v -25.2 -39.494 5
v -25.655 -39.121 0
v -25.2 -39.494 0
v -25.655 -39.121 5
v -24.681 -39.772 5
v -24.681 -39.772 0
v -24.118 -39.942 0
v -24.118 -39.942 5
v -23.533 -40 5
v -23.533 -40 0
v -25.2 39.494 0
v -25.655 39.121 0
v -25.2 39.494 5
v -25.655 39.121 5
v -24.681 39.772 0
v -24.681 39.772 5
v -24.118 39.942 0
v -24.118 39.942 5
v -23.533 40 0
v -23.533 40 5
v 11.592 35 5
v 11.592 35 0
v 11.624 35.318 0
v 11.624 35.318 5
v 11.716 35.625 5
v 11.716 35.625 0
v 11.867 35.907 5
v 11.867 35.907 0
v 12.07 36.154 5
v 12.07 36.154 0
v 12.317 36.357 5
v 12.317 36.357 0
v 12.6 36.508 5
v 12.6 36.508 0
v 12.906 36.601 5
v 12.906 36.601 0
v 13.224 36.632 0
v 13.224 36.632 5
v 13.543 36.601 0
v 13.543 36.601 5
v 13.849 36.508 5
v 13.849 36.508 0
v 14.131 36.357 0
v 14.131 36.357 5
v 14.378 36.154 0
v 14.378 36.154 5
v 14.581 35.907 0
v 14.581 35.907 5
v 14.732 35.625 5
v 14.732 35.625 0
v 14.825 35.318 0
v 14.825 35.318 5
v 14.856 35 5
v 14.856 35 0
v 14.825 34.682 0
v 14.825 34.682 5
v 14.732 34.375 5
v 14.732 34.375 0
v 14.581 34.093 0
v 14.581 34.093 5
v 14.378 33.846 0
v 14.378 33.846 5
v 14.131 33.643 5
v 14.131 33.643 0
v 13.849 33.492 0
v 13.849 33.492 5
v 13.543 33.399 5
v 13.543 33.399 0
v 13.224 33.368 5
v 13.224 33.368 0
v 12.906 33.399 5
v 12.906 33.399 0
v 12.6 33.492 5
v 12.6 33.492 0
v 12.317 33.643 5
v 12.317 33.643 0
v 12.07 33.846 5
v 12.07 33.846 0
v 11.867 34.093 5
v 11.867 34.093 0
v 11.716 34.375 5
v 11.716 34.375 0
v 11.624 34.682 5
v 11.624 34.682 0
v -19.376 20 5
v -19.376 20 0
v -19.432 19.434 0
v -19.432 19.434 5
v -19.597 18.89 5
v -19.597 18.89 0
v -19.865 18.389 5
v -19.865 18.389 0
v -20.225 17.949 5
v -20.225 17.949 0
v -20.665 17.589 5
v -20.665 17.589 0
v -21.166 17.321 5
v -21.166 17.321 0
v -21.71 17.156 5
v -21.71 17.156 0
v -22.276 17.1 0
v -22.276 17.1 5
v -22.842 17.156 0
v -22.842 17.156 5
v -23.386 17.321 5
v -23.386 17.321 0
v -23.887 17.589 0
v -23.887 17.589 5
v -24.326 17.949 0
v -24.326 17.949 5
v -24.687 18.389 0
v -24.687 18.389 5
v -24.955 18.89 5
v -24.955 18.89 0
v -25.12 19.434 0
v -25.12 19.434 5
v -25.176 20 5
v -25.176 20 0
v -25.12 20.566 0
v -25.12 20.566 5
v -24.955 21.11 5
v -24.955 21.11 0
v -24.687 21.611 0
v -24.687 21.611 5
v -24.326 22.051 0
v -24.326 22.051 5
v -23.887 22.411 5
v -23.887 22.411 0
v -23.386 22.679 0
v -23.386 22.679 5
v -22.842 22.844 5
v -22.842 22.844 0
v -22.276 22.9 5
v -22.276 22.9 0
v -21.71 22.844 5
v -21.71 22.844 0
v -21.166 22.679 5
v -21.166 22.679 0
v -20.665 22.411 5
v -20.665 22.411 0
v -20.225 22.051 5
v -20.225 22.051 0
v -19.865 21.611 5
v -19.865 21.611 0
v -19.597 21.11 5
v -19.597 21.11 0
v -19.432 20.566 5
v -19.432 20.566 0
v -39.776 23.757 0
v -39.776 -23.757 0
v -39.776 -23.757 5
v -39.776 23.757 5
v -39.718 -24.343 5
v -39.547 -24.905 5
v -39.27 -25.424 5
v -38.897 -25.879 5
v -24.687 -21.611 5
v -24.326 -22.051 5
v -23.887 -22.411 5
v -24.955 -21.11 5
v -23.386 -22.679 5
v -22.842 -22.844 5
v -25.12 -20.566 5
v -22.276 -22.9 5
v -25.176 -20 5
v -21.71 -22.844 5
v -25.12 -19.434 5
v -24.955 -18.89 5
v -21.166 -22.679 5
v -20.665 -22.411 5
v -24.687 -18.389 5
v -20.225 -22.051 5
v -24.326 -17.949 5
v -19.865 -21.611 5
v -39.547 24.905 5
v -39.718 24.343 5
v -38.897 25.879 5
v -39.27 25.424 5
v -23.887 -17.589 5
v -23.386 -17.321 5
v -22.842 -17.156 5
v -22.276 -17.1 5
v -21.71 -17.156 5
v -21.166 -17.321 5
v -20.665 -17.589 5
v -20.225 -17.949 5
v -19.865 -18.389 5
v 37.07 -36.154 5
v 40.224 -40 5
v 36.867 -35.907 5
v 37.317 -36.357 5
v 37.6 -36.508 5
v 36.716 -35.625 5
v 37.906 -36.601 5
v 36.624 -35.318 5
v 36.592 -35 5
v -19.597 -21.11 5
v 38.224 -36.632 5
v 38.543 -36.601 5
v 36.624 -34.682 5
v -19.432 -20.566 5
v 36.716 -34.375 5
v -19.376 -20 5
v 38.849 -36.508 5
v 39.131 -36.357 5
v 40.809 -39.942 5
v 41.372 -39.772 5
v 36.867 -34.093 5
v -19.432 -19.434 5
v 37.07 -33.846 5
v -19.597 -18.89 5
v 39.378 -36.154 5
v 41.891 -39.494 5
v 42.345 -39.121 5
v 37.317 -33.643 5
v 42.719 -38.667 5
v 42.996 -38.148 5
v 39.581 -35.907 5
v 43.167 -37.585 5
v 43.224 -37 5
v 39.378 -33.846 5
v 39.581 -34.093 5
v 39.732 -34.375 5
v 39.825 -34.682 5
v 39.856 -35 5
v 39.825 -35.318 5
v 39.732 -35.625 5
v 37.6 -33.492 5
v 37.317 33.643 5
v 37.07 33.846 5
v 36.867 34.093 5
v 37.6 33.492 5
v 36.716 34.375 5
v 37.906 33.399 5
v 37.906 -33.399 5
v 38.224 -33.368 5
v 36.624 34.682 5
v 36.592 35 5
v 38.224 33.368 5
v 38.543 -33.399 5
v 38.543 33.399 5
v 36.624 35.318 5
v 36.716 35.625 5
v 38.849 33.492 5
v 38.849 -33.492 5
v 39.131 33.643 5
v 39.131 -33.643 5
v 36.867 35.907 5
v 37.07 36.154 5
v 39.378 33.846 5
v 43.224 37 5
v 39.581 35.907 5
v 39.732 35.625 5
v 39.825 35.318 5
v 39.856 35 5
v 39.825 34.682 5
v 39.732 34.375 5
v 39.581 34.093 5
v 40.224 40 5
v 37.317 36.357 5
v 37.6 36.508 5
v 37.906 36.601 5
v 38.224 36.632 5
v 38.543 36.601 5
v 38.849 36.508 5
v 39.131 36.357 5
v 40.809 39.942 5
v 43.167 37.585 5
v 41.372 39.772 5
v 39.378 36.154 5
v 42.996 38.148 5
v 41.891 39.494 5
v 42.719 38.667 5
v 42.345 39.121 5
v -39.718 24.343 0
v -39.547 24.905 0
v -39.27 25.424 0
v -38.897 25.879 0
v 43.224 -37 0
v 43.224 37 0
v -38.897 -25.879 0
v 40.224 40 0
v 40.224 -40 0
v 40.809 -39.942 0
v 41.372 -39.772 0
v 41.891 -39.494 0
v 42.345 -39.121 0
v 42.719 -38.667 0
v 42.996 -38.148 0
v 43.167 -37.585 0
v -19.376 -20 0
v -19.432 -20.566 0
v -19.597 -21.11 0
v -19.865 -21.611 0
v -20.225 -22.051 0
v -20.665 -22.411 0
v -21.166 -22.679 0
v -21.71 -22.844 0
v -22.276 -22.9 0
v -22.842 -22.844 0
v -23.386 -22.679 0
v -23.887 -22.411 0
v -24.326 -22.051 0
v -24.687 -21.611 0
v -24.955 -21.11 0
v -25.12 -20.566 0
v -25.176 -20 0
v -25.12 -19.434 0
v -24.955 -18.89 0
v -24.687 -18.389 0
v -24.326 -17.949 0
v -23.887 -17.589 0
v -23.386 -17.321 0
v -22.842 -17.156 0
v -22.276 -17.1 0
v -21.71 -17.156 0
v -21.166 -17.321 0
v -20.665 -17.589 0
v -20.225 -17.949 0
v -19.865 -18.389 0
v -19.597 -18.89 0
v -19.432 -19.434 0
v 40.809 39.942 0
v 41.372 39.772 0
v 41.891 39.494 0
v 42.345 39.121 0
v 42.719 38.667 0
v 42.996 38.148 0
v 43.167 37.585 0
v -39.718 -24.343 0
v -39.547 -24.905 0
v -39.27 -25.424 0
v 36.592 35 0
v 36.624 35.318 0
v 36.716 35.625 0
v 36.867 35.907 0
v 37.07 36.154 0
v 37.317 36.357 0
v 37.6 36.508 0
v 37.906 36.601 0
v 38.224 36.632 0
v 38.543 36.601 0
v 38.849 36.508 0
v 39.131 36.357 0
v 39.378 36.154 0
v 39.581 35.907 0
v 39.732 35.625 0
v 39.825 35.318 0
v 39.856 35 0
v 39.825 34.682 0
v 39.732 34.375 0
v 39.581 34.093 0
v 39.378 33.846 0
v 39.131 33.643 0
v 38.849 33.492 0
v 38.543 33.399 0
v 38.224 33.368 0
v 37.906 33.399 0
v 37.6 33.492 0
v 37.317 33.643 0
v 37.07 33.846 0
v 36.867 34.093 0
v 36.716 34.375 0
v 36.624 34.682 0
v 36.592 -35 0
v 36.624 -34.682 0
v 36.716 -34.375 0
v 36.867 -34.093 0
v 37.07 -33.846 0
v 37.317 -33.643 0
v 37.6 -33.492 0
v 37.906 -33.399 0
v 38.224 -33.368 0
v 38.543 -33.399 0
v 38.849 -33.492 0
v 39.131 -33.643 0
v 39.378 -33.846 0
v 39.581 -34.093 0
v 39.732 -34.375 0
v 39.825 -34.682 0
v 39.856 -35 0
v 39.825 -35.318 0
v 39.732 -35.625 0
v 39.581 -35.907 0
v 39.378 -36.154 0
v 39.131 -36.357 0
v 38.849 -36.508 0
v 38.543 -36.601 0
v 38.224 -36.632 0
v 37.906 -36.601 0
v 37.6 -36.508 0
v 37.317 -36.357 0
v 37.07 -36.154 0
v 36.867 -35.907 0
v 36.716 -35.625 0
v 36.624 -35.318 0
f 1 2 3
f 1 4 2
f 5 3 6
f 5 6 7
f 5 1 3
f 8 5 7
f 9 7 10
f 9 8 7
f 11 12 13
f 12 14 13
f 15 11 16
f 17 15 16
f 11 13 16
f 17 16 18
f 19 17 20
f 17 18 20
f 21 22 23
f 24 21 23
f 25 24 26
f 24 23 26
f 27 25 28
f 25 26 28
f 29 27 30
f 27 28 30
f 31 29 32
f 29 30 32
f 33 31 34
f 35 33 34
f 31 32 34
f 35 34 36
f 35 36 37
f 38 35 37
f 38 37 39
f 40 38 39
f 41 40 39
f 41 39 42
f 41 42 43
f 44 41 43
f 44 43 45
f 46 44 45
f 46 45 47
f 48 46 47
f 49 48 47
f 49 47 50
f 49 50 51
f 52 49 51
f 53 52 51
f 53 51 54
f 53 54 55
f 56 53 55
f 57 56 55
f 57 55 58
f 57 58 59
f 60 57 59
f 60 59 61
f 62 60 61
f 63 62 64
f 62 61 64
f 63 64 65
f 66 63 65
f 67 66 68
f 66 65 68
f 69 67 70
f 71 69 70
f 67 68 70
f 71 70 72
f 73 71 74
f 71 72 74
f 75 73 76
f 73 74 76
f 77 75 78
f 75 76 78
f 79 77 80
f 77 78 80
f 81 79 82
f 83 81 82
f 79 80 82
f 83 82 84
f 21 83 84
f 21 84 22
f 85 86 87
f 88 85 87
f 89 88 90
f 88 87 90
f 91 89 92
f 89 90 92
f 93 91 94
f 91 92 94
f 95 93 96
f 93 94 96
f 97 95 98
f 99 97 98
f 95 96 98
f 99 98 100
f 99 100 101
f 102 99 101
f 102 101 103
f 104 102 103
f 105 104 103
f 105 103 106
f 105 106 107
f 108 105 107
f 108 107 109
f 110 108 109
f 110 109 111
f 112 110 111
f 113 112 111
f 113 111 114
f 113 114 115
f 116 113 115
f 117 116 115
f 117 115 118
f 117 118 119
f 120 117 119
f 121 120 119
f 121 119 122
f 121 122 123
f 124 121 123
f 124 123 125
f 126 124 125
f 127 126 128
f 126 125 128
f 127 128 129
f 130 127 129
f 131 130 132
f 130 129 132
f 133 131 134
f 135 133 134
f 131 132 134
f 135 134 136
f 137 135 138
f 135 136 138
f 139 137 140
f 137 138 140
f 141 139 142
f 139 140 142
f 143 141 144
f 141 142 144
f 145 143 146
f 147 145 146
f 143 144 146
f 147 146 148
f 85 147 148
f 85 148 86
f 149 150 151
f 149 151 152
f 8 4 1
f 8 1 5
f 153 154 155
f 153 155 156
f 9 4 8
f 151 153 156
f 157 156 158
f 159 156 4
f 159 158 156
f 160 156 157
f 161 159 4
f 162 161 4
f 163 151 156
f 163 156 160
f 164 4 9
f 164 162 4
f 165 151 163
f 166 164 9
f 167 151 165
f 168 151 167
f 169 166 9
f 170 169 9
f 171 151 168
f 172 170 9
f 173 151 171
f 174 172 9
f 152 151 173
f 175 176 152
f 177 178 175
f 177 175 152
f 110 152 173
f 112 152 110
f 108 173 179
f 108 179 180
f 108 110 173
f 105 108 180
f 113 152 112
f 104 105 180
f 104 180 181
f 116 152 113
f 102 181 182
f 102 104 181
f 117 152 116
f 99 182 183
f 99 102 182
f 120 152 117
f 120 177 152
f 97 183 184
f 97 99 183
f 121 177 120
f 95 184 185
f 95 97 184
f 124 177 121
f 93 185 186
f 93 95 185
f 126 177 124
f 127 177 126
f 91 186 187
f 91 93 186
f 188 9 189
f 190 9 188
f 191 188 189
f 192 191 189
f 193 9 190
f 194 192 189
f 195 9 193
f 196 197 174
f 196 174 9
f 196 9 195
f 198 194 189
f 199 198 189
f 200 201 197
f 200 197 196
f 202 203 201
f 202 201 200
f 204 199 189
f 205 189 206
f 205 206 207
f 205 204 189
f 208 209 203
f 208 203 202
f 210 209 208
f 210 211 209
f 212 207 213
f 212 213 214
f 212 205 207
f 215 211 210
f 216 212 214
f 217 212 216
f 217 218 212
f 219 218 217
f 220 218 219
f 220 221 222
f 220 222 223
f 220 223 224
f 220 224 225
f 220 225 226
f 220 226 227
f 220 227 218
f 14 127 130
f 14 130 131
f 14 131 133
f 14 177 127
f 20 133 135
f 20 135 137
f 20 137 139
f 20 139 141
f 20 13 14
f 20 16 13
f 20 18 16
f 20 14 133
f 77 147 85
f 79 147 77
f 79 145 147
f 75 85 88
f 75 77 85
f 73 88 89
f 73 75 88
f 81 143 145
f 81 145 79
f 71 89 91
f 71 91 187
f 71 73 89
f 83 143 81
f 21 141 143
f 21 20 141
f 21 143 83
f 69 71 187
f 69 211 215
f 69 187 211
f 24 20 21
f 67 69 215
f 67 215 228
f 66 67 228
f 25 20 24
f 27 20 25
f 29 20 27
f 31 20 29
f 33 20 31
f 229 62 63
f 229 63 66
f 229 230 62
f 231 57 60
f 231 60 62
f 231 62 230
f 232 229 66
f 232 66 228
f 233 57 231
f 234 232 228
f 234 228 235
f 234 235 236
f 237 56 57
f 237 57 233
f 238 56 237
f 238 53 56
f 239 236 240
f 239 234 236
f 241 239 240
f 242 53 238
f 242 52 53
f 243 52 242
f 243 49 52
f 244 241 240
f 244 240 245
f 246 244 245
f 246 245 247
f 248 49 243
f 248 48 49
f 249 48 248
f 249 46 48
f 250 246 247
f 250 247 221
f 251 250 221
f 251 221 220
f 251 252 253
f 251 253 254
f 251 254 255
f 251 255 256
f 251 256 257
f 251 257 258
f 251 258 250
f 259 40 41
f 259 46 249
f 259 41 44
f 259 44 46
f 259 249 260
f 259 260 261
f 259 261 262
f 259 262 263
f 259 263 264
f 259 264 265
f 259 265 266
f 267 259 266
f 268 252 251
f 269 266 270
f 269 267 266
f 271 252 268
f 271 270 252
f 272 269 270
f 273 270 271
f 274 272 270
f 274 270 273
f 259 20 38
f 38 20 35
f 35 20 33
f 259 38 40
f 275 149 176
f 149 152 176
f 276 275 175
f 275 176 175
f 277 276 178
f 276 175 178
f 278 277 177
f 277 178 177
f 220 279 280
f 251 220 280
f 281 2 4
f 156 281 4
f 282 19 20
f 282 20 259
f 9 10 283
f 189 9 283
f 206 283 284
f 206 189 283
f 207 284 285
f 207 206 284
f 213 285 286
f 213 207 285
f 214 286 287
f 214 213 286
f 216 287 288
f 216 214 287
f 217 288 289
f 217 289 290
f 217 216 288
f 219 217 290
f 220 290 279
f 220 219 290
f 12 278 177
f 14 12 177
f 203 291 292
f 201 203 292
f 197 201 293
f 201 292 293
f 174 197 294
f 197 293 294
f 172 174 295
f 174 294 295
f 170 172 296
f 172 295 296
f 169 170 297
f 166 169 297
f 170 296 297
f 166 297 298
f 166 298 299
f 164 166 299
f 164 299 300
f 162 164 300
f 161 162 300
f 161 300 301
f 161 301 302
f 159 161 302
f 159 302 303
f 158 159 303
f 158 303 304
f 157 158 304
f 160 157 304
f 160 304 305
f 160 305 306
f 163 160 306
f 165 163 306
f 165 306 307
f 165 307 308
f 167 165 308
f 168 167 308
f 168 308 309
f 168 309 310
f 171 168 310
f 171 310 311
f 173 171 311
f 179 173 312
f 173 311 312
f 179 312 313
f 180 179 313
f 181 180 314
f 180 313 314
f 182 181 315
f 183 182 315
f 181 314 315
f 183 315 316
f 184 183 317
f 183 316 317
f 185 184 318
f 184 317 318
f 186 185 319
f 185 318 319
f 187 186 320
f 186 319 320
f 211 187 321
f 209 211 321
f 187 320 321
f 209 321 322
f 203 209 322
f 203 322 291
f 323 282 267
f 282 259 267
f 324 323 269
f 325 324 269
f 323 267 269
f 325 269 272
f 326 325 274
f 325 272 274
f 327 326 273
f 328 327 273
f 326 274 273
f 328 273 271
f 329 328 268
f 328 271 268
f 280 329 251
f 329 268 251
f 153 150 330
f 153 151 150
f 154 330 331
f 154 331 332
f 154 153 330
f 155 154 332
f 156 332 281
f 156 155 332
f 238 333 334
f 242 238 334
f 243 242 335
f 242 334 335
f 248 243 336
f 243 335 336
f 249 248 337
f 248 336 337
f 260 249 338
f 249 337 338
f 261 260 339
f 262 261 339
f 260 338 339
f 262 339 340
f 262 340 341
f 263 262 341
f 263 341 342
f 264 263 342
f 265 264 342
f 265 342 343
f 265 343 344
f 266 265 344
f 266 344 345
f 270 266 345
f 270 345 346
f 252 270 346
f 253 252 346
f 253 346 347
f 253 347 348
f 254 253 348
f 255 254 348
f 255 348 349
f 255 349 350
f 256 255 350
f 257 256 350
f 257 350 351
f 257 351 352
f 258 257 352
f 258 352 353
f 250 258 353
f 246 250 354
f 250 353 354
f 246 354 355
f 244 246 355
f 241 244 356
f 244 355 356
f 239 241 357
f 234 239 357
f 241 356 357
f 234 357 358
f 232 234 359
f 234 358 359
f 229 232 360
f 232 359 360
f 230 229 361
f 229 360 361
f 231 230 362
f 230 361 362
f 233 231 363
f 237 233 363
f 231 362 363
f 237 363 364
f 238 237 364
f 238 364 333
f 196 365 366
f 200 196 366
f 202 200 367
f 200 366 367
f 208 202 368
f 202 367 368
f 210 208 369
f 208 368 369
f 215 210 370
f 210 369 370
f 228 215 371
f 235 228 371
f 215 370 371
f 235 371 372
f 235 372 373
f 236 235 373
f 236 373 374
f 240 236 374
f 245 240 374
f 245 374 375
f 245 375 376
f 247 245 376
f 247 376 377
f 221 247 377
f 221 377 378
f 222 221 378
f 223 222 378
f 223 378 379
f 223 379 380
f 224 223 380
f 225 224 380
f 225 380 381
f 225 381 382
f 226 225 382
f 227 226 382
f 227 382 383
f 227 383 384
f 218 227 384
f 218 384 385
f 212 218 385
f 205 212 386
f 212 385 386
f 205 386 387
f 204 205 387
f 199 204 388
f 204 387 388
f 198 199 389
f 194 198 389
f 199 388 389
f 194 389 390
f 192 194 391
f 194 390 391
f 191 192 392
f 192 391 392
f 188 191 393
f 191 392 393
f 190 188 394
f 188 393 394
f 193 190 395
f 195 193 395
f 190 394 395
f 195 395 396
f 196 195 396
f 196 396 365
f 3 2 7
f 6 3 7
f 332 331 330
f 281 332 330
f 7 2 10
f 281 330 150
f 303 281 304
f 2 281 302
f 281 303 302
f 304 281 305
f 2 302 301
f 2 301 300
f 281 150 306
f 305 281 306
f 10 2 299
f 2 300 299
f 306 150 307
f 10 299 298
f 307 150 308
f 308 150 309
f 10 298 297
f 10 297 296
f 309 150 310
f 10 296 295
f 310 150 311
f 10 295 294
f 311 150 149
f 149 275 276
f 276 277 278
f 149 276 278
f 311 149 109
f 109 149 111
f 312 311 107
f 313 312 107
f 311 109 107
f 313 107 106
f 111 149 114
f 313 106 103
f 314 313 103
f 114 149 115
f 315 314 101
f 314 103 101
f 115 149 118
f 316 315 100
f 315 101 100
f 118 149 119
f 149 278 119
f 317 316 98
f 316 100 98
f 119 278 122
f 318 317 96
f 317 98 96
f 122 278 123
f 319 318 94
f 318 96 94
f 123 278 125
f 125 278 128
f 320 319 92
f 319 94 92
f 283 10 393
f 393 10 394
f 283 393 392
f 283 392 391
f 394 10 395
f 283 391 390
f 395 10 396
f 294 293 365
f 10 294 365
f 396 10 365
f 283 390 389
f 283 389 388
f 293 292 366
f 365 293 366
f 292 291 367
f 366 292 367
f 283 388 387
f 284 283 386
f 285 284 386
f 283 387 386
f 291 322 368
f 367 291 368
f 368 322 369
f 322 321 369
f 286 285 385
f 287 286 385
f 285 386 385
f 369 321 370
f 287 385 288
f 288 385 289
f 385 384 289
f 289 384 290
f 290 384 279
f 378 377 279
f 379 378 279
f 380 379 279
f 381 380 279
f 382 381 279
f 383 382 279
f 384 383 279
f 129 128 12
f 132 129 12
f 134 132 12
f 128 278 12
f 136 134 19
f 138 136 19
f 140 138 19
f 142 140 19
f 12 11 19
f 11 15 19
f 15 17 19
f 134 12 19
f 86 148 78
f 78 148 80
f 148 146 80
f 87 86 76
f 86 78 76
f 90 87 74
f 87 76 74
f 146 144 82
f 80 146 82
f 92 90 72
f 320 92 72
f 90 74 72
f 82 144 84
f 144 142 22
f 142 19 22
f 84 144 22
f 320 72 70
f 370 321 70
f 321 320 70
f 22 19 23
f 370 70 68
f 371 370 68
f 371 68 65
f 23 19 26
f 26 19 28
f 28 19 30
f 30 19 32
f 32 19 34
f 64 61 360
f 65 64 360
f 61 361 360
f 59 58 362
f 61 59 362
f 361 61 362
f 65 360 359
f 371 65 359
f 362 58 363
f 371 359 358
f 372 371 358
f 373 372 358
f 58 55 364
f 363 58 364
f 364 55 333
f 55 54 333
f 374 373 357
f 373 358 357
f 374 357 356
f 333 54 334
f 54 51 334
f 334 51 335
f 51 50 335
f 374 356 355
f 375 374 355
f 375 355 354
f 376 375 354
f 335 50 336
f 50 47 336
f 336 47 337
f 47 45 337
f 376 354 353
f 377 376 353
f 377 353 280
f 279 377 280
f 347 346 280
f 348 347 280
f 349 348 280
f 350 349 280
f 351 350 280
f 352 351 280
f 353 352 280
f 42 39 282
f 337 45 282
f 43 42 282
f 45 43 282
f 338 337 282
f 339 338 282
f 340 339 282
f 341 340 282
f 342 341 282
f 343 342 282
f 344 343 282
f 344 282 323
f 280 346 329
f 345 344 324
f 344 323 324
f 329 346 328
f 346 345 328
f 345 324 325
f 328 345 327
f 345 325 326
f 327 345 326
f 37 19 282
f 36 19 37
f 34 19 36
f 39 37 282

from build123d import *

# Parameters (mm, degrees)
BASE_W                = 83
BASE_H                = 80
MAIN_DEPTH            = 5
GEAR_AXIS_HOLES_D     = 5.8
CHAMFER1_SIZE         = 15
FILLET6_R             = 3
F_4_CLEARANCE_HOLE1_D = 3.2639


with BuildPart() as part:
    # Base → Main (new body)
    with BuildSketch(Plane.XY):
        with Locations((1.724154817, 0)):
            Rectangle(BASE_W, BASE_H)
    extrude(amount=MAIN_DEPTH)

    # Gear Axis Holes (through all)
    with Locations(Plane(origin=(0, 0, 5), x_dir=(-1, 0, 0), z_dir=(0, 0, 1))):
        with Locations((22.275845183, 20), (22.275845183, -20)):
            Hole(GEAR_AXIS_HOLES_D / 2)

    # Chamfer1
    chamfer1_edges = [part.edges().sort_by_distance(p)[0] for p in [
        (-39.775845183, -40, 2.5),
        (-39.775845183, 40, 2.5),
    ]]
    chamfer(chamfer1_edges, length=CHAMFER1_SIZE)

    # Fillet6
    fillet6_edges = [part.edges().sort_by_distance(p)[0] for p in [
        (-24.775845183, -40, 2.5),
        (-39.775845183, 25, 2.5),
        (-39.775845183, -25, 2.5),
        (-24.775845183, 40, 2.5),
        (43.224154817, 40, 2.5),
        (43.224154817, -40, 2.5),
    ]]
    fillet(fillet6_edges, radius=FILLET6_R)

    # #4 Clearance Hole1 (through all)
    with Locations(Plane.XY.offset(5)):
        with Locations((13.224154817, 35), (38.224154817, 35), (38.224154817, -35)):
            Hole(F_4_CLEARANCE_HOLE1_D / 2)


solid = part.part
